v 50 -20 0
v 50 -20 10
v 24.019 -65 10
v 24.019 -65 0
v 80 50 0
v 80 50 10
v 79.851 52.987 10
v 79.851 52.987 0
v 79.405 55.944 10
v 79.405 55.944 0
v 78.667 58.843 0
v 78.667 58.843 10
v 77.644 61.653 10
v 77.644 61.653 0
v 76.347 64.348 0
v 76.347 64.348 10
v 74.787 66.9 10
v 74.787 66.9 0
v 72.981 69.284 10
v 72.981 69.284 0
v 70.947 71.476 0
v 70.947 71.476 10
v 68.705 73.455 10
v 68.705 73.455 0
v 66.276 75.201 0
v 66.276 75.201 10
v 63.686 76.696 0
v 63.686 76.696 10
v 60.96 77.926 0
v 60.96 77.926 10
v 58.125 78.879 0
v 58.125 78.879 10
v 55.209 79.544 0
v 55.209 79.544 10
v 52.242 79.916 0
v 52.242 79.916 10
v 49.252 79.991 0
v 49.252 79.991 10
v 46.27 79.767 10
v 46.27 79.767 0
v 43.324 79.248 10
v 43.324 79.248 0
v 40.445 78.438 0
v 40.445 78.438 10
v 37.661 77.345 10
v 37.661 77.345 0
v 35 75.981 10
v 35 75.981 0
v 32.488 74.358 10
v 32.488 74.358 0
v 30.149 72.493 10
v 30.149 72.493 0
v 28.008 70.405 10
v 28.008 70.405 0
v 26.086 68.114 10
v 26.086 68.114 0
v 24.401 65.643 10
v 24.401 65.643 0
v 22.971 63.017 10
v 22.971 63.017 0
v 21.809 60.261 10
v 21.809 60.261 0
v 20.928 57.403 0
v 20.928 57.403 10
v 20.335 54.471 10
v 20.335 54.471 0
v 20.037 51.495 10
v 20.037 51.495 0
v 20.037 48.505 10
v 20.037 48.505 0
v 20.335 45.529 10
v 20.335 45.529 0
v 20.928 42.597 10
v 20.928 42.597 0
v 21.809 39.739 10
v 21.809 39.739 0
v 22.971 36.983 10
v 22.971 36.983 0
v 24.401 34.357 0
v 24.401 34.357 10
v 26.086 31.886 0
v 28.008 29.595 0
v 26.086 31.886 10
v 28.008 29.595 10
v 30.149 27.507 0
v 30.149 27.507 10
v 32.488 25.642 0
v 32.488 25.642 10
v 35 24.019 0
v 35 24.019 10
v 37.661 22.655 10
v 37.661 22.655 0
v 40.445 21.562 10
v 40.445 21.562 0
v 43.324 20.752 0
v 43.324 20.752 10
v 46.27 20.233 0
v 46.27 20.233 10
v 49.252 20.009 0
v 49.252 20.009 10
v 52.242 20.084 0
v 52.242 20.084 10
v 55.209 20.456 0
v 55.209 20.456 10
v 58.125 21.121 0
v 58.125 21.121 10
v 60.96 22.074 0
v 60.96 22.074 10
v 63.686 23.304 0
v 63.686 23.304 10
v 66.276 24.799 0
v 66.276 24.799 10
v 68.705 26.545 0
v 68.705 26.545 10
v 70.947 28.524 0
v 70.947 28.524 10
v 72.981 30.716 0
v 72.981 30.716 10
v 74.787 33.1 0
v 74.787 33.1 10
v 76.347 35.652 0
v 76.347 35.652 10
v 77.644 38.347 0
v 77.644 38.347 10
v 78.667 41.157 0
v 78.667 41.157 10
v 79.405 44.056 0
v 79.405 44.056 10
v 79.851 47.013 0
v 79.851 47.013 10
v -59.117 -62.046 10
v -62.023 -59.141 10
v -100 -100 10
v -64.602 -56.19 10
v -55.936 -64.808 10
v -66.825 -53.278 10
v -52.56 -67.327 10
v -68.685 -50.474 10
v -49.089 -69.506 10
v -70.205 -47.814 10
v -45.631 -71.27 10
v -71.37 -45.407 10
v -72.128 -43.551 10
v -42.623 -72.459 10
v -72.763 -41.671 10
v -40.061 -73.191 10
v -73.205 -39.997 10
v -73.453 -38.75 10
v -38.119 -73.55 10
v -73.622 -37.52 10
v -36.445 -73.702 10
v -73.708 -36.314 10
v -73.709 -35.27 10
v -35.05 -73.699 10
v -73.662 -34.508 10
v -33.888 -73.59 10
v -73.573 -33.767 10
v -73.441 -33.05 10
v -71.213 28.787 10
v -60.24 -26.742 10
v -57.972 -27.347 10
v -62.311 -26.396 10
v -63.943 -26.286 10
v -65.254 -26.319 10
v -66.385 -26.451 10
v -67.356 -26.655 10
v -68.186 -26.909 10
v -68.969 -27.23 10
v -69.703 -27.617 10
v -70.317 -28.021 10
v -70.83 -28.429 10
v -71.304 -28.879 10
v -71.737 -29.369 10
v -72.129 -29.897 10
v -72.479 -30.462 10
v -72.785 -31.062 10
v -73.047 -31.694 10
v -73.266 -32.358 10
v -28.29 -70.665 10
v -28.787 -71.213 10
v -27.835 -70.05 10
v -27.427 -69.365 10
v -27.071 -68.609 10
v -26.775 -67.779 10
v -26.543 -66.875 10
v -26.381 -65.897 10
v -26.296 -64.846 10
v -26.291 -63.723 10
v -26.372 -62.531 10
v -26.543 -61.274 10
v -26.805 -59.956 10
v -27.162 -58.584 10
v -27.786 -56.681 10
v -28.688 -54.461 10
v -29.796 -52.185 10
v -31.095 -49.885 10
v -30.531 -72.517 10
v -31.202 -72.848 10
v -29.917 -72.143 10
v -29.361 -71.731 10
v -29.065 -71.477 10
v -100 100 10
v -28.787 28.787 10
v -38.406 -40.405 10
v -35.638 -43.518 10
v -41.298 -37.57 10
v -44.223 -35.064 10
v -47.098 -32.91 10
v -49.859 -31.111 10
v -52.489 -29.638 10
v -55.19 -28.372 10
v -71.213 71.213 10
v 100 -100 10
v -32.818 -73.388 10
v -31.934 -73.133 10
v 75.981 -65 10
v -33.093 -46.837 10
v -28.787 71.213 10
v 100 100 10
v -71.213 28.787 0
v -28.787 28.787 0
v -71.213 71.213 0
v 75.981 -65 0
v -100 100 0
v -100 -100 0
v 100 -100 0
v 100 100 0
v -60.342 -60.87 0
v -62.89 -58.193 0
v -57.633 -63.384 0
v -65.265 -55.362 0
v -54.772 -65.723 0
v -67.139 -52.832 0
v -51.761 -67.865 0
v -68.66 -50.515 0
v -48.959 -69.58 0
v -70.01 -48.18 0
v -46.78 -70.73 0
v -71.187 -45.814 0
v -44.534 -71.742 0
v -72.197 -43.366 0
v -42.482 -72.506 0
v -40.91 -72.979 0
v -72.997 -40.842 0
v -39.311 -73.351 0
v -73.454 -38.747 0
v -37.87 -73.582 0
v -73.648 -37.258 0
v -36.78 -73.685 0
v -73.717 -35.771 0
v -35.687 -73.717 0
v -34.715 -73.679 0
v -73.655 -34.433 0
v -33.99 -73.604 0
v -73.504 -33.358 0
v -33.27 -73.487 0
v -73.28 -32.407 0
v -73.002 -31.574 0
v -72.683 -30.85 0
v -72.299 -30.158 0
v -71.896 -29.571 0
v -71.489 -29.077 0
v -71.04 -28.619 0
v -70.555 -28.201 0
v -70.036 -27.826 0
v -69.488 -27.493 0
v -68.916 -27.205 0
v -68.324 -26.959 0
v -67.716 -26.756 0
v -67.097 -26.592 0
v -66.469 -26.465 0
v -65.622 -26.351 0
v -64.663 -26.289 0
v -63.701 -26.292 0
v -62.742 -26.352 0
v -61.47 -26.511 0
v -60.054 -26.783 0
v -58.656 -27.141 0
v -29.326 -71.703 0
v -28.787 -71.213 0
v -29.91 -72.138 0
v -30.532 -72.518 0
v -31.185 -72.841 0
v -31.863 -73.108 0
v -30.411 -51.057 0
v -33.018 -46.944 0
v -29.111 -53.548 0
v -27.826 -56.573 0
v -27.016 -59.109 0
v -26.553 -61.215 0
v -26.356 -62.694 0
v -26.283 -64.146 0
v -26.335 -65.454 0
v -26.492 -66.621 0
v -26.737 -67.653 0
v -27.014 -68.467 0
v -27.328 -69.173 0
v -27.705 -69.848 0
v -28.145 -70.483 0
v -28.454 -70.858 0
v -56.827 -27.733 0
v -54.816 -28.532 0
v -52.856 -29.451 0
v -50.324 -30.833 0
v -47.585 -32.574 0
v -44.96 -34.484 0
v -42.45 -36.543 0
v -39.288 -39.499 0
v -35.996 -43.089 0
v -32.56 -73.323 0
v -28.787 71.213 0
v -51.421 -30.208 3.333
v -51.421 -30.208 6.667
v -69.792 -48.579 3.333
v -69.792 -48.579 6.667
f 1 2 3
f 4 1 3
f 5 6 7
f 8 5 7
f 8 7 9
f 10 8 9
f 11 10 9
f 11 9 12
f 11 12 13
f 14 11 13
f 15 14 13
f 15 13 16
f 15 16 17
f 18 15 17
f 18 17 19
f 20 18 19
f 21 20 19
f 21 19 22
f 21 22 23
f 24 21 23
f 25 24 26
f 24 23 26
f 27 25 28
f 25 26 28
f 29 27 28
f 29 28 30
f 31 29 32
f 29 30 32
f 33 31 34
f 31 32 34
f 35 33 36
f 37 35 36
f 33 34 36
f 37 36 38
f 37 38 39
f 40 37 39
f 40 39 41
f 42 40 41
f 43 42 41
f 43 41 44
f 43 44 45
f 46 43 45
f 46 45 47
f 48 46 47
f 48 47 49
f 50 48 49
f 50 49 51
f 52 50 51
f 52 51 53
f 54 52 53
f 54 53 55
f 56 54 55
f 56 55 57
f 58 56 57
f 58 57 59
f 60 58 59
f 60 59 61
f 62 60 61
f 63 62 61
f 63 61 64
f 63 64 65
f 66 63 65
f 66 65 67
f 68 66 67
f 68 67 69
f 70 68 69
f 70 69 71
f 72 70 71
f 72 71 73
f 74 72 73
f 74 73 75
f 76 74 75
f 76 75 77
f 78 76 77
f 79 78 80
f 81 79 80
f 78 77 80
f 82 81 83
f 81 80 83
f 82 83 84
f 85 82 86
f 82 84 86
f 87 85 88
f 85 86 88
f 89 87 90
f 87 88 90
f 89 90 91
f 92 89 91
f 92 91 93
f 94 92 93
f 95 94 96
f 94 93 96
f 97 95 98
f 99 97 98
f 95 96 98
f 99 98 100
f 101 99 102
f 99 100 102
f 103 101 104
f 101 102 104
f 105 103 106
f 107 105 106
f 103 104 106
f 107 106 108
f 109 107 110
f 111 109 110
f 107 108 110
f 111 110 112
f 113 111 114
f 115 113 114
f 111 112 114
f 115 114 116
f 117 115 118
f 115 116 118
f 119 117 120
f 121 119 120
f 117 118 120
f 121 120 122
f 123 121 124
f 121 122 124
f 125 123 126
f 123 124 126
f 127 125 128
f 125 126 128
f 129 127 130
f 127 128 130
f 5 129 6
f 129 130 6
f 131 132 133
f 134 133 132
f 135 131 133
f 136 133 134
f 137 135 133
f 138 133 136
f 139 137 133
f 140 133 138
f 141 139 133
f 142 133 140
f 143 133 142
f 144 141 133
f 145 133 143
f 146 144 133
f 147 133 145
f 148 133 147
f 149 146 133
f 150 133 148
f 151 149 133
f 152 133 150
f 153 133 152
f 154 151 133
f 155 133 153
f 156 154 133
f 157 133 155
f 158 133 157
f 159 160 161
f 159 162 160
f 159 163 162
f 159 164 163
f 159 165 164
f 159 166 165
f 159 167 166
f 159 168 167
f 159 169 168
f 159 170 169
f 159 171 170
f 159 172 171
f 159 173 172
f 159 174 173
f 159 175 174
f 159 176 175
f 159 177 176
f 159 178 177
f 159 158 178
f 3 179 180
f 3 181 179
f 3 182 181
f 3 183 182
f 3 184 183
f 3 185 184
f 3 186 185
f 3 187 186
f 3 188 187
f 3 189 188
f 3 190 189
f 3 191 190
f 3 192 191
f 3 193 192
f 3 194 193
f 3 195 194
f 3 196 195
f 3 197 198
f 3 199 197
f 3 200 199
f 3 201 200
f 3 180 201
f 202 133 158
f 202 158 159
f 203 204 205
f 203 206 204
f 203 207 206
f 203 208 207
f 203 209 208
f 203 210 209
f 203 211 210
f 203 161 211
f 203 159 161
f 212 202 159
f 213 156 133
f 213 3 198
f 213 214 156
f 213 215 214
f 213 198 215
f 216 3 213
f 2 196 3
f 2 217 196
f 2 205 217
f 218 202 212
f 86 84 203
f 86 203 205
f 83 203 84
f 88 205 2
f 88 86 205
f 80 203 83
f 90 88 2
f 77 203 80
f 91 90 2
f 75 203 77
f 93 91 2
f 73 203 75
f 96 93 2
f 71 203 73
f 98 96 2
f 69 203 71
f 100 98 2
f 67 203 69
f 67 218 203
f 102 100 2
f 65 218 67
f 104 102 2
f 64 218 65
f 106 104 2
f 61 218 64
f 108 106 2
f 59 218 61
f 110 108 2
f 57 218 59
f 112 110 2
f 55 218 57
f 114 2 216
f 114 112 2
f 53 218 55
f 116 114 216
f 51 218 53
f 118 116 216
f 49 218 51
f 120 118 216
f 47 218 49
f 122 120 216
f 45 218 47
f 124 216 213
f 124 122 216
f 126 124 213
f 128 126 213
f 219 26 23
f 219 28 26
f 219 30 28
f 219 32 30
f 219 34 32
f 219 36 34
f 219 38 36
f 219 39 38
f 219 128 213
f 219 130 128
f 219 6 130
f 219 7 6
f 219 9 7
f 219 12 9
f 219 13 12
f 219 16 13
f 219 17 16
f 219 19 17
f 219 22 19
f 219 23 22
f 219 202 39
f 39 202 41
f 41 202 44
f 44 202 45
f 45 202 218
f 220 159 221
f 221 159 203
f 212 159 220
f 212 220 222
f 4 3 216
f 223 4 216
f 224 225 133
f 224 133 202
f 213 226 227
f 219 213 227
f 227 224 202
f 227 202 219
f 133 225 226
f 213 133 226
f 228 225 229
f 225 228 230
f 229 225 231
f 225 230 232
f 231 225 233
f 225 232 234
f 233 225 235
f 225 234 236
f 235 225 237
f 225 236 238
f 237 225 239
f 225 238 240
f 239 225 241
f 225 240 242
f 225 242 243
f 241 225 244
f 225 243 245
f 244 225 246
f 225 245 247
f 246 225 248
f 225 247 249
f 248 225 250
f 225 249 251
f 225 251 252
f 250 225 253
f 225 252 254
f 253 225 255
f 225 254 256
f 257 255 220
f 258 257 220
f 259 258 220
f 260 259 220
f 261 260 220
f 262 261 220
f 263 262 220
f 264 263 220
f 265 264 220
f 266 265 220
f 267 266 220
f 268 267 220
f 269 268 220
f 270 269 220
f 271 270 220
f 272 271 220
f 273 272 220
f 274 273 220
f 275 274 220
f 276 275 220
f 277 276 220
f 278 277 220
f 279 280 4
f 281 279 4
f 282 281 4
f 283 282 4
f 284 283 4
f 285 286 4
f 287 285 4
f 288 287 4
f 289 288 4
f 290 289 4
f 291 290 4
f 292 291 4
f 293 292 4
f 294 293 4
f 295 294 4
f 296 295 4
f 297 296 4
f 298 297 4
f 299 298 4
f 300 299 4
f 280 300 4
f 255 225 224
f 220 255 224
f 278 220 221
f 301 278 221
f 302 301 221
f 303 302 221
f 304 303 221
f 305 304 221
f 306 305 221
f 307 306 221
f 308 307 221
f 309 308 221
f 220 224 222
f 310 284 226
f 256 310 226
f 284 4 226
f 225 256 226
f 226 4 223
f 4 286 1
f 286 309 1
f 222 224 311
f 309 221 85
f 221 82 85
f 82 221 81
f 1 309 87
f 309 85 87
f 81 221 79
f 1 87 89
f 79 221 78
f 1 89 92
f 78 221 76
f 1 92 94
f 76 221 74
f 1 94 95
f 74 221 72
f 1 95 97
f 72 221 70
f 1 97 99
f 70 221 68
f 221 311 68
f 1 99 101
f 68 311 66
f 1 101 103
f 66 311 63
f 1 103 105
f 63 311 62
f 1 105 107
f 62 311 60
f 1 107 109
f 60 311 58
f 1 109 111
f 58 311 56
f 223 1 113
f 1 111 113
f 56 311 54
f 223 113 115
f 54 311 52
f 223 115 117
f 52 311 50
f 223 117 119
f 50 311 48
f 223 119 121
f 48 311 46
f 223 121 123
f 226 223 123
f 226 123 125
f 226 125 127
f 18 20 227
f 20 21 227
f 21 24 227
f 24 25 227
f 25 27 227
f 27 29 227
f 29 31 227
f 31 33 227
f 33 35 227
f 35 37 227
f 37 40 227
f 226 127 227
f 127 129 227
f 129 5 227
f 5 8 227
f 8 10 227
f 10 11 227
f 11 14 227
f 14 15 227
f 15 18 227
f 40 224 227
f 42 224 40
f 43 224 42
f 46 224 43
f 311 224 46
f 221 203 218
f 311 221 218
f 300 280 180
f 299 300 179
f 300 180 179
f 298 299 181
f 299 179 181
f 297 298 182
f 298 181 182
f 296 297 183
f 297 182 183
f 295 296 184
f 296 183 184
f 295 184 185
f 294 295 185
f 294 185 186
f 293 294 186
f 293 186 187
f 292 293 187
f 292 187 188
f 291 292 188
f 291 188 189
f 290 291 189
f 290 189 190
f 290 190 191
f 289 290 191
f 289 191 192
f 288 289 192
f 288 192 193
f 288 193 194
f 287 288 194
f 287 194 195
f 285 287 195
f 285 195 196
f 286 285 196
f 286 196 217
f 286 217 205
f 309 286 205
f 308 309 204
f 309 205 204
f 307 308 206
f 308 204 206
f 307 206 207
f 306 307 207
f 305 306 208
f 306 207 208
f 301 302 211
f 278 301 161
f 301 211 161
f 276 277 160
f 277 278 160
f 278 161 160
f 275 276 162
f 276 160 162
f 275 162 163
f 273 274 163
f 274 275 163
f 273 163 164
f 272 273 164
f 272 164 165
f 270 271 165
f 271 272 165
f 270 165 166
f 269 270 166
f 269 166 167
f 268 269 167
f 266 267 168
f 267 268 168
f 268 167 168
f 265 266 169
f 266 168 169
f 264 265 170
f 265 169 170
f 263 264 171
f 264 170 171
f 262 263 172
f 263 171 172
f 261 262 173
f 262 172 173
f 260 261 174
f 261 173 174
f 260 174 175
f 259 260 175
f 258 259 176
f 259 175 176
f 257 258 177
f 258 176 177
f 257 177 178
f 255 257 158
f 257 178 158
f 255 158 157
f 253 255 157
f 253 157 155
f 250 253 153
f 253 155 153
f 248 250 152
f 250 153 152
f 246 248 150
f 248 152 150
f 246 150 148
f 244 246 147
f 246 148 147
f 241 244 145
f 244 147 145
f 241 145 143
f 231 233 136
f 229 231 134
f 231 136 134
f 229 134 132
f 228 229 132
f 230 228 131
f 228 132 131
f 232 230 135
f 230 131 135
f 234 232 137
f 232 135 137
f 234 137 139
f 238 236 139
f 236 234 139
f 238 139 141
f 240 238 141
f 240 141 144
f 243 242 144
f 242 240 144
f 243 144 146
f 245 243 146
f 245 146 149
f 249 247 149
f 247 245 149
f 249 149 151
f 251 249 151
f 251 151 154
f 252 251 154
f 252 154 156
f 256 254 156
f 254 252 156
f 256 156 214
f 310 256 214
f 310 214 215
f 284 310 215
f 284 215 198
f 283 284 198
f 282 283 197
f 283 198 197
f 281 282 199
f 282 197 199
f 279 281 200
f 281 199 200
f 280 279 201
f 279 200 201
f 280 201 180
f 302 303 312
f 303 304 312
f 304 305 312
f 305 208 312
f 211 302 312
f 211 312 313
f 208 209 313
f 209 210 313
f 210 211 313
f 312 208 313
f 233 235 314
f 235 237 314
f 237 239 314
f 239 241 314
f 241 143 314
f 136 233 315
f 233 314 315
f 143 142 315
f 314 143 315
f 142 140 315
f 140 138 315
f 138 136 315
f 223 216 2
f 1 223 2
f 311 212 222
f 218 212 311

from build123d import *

# Parameters (mm, degrees)
SKETCH_W     = 200
SKETCH_H     = 200
PAD_DEPTH    = 10
SKETCH001_R  = 30
SKETCH001_W  = 42.426406
SKETCH001_H  = 42.426406
POCKET_DEPTH = 10.001


with BuildPart() as part:
    # Sketch → Pad (new body)
    with BuildSketch(Plane.XY):
        Rectangle(SKETCH_W, SKETCH_H)
    extrude(amount=PAD_DEPTH)

    # Sketch001 (on Face6 of Pad) → Pocket (cut, through all)
    with BuildSketch(Plane.XY.offset(10)):
        with Locations((50, 50)):
            Circle(SKETCH001_R)
        with BuildLine():
            add(Edge.make_bspline(
                [(-28.786797, -71.213203), (-10.415623, -52.84203), (-51.421015, -30.207812), (-92.426407, -7.573593), (-69.792188, -48.578985), (-47.15797, -89.584377), (-28.786797, -71.213203)],
                knots=[0, 0, 0, 2.094395, 2.094395, 4.18879, 4.18879, 6.283185, 6.283185, 6.283185], degree=2, weights=[1, 0.5, 1, 0.5, 1, 0.5, 1]))
        make_face()
        Polygon((75.980762, -65), (50, -20), (24.019238, -65), align=None)
        with Locations((-50, 50)):
            Rectangle(SKETCH001_W, SKETCH001_H)
    extrude(amount=-POCKET_DEPTH, mode=Mode.SUBTRACT)


solid = part.part
